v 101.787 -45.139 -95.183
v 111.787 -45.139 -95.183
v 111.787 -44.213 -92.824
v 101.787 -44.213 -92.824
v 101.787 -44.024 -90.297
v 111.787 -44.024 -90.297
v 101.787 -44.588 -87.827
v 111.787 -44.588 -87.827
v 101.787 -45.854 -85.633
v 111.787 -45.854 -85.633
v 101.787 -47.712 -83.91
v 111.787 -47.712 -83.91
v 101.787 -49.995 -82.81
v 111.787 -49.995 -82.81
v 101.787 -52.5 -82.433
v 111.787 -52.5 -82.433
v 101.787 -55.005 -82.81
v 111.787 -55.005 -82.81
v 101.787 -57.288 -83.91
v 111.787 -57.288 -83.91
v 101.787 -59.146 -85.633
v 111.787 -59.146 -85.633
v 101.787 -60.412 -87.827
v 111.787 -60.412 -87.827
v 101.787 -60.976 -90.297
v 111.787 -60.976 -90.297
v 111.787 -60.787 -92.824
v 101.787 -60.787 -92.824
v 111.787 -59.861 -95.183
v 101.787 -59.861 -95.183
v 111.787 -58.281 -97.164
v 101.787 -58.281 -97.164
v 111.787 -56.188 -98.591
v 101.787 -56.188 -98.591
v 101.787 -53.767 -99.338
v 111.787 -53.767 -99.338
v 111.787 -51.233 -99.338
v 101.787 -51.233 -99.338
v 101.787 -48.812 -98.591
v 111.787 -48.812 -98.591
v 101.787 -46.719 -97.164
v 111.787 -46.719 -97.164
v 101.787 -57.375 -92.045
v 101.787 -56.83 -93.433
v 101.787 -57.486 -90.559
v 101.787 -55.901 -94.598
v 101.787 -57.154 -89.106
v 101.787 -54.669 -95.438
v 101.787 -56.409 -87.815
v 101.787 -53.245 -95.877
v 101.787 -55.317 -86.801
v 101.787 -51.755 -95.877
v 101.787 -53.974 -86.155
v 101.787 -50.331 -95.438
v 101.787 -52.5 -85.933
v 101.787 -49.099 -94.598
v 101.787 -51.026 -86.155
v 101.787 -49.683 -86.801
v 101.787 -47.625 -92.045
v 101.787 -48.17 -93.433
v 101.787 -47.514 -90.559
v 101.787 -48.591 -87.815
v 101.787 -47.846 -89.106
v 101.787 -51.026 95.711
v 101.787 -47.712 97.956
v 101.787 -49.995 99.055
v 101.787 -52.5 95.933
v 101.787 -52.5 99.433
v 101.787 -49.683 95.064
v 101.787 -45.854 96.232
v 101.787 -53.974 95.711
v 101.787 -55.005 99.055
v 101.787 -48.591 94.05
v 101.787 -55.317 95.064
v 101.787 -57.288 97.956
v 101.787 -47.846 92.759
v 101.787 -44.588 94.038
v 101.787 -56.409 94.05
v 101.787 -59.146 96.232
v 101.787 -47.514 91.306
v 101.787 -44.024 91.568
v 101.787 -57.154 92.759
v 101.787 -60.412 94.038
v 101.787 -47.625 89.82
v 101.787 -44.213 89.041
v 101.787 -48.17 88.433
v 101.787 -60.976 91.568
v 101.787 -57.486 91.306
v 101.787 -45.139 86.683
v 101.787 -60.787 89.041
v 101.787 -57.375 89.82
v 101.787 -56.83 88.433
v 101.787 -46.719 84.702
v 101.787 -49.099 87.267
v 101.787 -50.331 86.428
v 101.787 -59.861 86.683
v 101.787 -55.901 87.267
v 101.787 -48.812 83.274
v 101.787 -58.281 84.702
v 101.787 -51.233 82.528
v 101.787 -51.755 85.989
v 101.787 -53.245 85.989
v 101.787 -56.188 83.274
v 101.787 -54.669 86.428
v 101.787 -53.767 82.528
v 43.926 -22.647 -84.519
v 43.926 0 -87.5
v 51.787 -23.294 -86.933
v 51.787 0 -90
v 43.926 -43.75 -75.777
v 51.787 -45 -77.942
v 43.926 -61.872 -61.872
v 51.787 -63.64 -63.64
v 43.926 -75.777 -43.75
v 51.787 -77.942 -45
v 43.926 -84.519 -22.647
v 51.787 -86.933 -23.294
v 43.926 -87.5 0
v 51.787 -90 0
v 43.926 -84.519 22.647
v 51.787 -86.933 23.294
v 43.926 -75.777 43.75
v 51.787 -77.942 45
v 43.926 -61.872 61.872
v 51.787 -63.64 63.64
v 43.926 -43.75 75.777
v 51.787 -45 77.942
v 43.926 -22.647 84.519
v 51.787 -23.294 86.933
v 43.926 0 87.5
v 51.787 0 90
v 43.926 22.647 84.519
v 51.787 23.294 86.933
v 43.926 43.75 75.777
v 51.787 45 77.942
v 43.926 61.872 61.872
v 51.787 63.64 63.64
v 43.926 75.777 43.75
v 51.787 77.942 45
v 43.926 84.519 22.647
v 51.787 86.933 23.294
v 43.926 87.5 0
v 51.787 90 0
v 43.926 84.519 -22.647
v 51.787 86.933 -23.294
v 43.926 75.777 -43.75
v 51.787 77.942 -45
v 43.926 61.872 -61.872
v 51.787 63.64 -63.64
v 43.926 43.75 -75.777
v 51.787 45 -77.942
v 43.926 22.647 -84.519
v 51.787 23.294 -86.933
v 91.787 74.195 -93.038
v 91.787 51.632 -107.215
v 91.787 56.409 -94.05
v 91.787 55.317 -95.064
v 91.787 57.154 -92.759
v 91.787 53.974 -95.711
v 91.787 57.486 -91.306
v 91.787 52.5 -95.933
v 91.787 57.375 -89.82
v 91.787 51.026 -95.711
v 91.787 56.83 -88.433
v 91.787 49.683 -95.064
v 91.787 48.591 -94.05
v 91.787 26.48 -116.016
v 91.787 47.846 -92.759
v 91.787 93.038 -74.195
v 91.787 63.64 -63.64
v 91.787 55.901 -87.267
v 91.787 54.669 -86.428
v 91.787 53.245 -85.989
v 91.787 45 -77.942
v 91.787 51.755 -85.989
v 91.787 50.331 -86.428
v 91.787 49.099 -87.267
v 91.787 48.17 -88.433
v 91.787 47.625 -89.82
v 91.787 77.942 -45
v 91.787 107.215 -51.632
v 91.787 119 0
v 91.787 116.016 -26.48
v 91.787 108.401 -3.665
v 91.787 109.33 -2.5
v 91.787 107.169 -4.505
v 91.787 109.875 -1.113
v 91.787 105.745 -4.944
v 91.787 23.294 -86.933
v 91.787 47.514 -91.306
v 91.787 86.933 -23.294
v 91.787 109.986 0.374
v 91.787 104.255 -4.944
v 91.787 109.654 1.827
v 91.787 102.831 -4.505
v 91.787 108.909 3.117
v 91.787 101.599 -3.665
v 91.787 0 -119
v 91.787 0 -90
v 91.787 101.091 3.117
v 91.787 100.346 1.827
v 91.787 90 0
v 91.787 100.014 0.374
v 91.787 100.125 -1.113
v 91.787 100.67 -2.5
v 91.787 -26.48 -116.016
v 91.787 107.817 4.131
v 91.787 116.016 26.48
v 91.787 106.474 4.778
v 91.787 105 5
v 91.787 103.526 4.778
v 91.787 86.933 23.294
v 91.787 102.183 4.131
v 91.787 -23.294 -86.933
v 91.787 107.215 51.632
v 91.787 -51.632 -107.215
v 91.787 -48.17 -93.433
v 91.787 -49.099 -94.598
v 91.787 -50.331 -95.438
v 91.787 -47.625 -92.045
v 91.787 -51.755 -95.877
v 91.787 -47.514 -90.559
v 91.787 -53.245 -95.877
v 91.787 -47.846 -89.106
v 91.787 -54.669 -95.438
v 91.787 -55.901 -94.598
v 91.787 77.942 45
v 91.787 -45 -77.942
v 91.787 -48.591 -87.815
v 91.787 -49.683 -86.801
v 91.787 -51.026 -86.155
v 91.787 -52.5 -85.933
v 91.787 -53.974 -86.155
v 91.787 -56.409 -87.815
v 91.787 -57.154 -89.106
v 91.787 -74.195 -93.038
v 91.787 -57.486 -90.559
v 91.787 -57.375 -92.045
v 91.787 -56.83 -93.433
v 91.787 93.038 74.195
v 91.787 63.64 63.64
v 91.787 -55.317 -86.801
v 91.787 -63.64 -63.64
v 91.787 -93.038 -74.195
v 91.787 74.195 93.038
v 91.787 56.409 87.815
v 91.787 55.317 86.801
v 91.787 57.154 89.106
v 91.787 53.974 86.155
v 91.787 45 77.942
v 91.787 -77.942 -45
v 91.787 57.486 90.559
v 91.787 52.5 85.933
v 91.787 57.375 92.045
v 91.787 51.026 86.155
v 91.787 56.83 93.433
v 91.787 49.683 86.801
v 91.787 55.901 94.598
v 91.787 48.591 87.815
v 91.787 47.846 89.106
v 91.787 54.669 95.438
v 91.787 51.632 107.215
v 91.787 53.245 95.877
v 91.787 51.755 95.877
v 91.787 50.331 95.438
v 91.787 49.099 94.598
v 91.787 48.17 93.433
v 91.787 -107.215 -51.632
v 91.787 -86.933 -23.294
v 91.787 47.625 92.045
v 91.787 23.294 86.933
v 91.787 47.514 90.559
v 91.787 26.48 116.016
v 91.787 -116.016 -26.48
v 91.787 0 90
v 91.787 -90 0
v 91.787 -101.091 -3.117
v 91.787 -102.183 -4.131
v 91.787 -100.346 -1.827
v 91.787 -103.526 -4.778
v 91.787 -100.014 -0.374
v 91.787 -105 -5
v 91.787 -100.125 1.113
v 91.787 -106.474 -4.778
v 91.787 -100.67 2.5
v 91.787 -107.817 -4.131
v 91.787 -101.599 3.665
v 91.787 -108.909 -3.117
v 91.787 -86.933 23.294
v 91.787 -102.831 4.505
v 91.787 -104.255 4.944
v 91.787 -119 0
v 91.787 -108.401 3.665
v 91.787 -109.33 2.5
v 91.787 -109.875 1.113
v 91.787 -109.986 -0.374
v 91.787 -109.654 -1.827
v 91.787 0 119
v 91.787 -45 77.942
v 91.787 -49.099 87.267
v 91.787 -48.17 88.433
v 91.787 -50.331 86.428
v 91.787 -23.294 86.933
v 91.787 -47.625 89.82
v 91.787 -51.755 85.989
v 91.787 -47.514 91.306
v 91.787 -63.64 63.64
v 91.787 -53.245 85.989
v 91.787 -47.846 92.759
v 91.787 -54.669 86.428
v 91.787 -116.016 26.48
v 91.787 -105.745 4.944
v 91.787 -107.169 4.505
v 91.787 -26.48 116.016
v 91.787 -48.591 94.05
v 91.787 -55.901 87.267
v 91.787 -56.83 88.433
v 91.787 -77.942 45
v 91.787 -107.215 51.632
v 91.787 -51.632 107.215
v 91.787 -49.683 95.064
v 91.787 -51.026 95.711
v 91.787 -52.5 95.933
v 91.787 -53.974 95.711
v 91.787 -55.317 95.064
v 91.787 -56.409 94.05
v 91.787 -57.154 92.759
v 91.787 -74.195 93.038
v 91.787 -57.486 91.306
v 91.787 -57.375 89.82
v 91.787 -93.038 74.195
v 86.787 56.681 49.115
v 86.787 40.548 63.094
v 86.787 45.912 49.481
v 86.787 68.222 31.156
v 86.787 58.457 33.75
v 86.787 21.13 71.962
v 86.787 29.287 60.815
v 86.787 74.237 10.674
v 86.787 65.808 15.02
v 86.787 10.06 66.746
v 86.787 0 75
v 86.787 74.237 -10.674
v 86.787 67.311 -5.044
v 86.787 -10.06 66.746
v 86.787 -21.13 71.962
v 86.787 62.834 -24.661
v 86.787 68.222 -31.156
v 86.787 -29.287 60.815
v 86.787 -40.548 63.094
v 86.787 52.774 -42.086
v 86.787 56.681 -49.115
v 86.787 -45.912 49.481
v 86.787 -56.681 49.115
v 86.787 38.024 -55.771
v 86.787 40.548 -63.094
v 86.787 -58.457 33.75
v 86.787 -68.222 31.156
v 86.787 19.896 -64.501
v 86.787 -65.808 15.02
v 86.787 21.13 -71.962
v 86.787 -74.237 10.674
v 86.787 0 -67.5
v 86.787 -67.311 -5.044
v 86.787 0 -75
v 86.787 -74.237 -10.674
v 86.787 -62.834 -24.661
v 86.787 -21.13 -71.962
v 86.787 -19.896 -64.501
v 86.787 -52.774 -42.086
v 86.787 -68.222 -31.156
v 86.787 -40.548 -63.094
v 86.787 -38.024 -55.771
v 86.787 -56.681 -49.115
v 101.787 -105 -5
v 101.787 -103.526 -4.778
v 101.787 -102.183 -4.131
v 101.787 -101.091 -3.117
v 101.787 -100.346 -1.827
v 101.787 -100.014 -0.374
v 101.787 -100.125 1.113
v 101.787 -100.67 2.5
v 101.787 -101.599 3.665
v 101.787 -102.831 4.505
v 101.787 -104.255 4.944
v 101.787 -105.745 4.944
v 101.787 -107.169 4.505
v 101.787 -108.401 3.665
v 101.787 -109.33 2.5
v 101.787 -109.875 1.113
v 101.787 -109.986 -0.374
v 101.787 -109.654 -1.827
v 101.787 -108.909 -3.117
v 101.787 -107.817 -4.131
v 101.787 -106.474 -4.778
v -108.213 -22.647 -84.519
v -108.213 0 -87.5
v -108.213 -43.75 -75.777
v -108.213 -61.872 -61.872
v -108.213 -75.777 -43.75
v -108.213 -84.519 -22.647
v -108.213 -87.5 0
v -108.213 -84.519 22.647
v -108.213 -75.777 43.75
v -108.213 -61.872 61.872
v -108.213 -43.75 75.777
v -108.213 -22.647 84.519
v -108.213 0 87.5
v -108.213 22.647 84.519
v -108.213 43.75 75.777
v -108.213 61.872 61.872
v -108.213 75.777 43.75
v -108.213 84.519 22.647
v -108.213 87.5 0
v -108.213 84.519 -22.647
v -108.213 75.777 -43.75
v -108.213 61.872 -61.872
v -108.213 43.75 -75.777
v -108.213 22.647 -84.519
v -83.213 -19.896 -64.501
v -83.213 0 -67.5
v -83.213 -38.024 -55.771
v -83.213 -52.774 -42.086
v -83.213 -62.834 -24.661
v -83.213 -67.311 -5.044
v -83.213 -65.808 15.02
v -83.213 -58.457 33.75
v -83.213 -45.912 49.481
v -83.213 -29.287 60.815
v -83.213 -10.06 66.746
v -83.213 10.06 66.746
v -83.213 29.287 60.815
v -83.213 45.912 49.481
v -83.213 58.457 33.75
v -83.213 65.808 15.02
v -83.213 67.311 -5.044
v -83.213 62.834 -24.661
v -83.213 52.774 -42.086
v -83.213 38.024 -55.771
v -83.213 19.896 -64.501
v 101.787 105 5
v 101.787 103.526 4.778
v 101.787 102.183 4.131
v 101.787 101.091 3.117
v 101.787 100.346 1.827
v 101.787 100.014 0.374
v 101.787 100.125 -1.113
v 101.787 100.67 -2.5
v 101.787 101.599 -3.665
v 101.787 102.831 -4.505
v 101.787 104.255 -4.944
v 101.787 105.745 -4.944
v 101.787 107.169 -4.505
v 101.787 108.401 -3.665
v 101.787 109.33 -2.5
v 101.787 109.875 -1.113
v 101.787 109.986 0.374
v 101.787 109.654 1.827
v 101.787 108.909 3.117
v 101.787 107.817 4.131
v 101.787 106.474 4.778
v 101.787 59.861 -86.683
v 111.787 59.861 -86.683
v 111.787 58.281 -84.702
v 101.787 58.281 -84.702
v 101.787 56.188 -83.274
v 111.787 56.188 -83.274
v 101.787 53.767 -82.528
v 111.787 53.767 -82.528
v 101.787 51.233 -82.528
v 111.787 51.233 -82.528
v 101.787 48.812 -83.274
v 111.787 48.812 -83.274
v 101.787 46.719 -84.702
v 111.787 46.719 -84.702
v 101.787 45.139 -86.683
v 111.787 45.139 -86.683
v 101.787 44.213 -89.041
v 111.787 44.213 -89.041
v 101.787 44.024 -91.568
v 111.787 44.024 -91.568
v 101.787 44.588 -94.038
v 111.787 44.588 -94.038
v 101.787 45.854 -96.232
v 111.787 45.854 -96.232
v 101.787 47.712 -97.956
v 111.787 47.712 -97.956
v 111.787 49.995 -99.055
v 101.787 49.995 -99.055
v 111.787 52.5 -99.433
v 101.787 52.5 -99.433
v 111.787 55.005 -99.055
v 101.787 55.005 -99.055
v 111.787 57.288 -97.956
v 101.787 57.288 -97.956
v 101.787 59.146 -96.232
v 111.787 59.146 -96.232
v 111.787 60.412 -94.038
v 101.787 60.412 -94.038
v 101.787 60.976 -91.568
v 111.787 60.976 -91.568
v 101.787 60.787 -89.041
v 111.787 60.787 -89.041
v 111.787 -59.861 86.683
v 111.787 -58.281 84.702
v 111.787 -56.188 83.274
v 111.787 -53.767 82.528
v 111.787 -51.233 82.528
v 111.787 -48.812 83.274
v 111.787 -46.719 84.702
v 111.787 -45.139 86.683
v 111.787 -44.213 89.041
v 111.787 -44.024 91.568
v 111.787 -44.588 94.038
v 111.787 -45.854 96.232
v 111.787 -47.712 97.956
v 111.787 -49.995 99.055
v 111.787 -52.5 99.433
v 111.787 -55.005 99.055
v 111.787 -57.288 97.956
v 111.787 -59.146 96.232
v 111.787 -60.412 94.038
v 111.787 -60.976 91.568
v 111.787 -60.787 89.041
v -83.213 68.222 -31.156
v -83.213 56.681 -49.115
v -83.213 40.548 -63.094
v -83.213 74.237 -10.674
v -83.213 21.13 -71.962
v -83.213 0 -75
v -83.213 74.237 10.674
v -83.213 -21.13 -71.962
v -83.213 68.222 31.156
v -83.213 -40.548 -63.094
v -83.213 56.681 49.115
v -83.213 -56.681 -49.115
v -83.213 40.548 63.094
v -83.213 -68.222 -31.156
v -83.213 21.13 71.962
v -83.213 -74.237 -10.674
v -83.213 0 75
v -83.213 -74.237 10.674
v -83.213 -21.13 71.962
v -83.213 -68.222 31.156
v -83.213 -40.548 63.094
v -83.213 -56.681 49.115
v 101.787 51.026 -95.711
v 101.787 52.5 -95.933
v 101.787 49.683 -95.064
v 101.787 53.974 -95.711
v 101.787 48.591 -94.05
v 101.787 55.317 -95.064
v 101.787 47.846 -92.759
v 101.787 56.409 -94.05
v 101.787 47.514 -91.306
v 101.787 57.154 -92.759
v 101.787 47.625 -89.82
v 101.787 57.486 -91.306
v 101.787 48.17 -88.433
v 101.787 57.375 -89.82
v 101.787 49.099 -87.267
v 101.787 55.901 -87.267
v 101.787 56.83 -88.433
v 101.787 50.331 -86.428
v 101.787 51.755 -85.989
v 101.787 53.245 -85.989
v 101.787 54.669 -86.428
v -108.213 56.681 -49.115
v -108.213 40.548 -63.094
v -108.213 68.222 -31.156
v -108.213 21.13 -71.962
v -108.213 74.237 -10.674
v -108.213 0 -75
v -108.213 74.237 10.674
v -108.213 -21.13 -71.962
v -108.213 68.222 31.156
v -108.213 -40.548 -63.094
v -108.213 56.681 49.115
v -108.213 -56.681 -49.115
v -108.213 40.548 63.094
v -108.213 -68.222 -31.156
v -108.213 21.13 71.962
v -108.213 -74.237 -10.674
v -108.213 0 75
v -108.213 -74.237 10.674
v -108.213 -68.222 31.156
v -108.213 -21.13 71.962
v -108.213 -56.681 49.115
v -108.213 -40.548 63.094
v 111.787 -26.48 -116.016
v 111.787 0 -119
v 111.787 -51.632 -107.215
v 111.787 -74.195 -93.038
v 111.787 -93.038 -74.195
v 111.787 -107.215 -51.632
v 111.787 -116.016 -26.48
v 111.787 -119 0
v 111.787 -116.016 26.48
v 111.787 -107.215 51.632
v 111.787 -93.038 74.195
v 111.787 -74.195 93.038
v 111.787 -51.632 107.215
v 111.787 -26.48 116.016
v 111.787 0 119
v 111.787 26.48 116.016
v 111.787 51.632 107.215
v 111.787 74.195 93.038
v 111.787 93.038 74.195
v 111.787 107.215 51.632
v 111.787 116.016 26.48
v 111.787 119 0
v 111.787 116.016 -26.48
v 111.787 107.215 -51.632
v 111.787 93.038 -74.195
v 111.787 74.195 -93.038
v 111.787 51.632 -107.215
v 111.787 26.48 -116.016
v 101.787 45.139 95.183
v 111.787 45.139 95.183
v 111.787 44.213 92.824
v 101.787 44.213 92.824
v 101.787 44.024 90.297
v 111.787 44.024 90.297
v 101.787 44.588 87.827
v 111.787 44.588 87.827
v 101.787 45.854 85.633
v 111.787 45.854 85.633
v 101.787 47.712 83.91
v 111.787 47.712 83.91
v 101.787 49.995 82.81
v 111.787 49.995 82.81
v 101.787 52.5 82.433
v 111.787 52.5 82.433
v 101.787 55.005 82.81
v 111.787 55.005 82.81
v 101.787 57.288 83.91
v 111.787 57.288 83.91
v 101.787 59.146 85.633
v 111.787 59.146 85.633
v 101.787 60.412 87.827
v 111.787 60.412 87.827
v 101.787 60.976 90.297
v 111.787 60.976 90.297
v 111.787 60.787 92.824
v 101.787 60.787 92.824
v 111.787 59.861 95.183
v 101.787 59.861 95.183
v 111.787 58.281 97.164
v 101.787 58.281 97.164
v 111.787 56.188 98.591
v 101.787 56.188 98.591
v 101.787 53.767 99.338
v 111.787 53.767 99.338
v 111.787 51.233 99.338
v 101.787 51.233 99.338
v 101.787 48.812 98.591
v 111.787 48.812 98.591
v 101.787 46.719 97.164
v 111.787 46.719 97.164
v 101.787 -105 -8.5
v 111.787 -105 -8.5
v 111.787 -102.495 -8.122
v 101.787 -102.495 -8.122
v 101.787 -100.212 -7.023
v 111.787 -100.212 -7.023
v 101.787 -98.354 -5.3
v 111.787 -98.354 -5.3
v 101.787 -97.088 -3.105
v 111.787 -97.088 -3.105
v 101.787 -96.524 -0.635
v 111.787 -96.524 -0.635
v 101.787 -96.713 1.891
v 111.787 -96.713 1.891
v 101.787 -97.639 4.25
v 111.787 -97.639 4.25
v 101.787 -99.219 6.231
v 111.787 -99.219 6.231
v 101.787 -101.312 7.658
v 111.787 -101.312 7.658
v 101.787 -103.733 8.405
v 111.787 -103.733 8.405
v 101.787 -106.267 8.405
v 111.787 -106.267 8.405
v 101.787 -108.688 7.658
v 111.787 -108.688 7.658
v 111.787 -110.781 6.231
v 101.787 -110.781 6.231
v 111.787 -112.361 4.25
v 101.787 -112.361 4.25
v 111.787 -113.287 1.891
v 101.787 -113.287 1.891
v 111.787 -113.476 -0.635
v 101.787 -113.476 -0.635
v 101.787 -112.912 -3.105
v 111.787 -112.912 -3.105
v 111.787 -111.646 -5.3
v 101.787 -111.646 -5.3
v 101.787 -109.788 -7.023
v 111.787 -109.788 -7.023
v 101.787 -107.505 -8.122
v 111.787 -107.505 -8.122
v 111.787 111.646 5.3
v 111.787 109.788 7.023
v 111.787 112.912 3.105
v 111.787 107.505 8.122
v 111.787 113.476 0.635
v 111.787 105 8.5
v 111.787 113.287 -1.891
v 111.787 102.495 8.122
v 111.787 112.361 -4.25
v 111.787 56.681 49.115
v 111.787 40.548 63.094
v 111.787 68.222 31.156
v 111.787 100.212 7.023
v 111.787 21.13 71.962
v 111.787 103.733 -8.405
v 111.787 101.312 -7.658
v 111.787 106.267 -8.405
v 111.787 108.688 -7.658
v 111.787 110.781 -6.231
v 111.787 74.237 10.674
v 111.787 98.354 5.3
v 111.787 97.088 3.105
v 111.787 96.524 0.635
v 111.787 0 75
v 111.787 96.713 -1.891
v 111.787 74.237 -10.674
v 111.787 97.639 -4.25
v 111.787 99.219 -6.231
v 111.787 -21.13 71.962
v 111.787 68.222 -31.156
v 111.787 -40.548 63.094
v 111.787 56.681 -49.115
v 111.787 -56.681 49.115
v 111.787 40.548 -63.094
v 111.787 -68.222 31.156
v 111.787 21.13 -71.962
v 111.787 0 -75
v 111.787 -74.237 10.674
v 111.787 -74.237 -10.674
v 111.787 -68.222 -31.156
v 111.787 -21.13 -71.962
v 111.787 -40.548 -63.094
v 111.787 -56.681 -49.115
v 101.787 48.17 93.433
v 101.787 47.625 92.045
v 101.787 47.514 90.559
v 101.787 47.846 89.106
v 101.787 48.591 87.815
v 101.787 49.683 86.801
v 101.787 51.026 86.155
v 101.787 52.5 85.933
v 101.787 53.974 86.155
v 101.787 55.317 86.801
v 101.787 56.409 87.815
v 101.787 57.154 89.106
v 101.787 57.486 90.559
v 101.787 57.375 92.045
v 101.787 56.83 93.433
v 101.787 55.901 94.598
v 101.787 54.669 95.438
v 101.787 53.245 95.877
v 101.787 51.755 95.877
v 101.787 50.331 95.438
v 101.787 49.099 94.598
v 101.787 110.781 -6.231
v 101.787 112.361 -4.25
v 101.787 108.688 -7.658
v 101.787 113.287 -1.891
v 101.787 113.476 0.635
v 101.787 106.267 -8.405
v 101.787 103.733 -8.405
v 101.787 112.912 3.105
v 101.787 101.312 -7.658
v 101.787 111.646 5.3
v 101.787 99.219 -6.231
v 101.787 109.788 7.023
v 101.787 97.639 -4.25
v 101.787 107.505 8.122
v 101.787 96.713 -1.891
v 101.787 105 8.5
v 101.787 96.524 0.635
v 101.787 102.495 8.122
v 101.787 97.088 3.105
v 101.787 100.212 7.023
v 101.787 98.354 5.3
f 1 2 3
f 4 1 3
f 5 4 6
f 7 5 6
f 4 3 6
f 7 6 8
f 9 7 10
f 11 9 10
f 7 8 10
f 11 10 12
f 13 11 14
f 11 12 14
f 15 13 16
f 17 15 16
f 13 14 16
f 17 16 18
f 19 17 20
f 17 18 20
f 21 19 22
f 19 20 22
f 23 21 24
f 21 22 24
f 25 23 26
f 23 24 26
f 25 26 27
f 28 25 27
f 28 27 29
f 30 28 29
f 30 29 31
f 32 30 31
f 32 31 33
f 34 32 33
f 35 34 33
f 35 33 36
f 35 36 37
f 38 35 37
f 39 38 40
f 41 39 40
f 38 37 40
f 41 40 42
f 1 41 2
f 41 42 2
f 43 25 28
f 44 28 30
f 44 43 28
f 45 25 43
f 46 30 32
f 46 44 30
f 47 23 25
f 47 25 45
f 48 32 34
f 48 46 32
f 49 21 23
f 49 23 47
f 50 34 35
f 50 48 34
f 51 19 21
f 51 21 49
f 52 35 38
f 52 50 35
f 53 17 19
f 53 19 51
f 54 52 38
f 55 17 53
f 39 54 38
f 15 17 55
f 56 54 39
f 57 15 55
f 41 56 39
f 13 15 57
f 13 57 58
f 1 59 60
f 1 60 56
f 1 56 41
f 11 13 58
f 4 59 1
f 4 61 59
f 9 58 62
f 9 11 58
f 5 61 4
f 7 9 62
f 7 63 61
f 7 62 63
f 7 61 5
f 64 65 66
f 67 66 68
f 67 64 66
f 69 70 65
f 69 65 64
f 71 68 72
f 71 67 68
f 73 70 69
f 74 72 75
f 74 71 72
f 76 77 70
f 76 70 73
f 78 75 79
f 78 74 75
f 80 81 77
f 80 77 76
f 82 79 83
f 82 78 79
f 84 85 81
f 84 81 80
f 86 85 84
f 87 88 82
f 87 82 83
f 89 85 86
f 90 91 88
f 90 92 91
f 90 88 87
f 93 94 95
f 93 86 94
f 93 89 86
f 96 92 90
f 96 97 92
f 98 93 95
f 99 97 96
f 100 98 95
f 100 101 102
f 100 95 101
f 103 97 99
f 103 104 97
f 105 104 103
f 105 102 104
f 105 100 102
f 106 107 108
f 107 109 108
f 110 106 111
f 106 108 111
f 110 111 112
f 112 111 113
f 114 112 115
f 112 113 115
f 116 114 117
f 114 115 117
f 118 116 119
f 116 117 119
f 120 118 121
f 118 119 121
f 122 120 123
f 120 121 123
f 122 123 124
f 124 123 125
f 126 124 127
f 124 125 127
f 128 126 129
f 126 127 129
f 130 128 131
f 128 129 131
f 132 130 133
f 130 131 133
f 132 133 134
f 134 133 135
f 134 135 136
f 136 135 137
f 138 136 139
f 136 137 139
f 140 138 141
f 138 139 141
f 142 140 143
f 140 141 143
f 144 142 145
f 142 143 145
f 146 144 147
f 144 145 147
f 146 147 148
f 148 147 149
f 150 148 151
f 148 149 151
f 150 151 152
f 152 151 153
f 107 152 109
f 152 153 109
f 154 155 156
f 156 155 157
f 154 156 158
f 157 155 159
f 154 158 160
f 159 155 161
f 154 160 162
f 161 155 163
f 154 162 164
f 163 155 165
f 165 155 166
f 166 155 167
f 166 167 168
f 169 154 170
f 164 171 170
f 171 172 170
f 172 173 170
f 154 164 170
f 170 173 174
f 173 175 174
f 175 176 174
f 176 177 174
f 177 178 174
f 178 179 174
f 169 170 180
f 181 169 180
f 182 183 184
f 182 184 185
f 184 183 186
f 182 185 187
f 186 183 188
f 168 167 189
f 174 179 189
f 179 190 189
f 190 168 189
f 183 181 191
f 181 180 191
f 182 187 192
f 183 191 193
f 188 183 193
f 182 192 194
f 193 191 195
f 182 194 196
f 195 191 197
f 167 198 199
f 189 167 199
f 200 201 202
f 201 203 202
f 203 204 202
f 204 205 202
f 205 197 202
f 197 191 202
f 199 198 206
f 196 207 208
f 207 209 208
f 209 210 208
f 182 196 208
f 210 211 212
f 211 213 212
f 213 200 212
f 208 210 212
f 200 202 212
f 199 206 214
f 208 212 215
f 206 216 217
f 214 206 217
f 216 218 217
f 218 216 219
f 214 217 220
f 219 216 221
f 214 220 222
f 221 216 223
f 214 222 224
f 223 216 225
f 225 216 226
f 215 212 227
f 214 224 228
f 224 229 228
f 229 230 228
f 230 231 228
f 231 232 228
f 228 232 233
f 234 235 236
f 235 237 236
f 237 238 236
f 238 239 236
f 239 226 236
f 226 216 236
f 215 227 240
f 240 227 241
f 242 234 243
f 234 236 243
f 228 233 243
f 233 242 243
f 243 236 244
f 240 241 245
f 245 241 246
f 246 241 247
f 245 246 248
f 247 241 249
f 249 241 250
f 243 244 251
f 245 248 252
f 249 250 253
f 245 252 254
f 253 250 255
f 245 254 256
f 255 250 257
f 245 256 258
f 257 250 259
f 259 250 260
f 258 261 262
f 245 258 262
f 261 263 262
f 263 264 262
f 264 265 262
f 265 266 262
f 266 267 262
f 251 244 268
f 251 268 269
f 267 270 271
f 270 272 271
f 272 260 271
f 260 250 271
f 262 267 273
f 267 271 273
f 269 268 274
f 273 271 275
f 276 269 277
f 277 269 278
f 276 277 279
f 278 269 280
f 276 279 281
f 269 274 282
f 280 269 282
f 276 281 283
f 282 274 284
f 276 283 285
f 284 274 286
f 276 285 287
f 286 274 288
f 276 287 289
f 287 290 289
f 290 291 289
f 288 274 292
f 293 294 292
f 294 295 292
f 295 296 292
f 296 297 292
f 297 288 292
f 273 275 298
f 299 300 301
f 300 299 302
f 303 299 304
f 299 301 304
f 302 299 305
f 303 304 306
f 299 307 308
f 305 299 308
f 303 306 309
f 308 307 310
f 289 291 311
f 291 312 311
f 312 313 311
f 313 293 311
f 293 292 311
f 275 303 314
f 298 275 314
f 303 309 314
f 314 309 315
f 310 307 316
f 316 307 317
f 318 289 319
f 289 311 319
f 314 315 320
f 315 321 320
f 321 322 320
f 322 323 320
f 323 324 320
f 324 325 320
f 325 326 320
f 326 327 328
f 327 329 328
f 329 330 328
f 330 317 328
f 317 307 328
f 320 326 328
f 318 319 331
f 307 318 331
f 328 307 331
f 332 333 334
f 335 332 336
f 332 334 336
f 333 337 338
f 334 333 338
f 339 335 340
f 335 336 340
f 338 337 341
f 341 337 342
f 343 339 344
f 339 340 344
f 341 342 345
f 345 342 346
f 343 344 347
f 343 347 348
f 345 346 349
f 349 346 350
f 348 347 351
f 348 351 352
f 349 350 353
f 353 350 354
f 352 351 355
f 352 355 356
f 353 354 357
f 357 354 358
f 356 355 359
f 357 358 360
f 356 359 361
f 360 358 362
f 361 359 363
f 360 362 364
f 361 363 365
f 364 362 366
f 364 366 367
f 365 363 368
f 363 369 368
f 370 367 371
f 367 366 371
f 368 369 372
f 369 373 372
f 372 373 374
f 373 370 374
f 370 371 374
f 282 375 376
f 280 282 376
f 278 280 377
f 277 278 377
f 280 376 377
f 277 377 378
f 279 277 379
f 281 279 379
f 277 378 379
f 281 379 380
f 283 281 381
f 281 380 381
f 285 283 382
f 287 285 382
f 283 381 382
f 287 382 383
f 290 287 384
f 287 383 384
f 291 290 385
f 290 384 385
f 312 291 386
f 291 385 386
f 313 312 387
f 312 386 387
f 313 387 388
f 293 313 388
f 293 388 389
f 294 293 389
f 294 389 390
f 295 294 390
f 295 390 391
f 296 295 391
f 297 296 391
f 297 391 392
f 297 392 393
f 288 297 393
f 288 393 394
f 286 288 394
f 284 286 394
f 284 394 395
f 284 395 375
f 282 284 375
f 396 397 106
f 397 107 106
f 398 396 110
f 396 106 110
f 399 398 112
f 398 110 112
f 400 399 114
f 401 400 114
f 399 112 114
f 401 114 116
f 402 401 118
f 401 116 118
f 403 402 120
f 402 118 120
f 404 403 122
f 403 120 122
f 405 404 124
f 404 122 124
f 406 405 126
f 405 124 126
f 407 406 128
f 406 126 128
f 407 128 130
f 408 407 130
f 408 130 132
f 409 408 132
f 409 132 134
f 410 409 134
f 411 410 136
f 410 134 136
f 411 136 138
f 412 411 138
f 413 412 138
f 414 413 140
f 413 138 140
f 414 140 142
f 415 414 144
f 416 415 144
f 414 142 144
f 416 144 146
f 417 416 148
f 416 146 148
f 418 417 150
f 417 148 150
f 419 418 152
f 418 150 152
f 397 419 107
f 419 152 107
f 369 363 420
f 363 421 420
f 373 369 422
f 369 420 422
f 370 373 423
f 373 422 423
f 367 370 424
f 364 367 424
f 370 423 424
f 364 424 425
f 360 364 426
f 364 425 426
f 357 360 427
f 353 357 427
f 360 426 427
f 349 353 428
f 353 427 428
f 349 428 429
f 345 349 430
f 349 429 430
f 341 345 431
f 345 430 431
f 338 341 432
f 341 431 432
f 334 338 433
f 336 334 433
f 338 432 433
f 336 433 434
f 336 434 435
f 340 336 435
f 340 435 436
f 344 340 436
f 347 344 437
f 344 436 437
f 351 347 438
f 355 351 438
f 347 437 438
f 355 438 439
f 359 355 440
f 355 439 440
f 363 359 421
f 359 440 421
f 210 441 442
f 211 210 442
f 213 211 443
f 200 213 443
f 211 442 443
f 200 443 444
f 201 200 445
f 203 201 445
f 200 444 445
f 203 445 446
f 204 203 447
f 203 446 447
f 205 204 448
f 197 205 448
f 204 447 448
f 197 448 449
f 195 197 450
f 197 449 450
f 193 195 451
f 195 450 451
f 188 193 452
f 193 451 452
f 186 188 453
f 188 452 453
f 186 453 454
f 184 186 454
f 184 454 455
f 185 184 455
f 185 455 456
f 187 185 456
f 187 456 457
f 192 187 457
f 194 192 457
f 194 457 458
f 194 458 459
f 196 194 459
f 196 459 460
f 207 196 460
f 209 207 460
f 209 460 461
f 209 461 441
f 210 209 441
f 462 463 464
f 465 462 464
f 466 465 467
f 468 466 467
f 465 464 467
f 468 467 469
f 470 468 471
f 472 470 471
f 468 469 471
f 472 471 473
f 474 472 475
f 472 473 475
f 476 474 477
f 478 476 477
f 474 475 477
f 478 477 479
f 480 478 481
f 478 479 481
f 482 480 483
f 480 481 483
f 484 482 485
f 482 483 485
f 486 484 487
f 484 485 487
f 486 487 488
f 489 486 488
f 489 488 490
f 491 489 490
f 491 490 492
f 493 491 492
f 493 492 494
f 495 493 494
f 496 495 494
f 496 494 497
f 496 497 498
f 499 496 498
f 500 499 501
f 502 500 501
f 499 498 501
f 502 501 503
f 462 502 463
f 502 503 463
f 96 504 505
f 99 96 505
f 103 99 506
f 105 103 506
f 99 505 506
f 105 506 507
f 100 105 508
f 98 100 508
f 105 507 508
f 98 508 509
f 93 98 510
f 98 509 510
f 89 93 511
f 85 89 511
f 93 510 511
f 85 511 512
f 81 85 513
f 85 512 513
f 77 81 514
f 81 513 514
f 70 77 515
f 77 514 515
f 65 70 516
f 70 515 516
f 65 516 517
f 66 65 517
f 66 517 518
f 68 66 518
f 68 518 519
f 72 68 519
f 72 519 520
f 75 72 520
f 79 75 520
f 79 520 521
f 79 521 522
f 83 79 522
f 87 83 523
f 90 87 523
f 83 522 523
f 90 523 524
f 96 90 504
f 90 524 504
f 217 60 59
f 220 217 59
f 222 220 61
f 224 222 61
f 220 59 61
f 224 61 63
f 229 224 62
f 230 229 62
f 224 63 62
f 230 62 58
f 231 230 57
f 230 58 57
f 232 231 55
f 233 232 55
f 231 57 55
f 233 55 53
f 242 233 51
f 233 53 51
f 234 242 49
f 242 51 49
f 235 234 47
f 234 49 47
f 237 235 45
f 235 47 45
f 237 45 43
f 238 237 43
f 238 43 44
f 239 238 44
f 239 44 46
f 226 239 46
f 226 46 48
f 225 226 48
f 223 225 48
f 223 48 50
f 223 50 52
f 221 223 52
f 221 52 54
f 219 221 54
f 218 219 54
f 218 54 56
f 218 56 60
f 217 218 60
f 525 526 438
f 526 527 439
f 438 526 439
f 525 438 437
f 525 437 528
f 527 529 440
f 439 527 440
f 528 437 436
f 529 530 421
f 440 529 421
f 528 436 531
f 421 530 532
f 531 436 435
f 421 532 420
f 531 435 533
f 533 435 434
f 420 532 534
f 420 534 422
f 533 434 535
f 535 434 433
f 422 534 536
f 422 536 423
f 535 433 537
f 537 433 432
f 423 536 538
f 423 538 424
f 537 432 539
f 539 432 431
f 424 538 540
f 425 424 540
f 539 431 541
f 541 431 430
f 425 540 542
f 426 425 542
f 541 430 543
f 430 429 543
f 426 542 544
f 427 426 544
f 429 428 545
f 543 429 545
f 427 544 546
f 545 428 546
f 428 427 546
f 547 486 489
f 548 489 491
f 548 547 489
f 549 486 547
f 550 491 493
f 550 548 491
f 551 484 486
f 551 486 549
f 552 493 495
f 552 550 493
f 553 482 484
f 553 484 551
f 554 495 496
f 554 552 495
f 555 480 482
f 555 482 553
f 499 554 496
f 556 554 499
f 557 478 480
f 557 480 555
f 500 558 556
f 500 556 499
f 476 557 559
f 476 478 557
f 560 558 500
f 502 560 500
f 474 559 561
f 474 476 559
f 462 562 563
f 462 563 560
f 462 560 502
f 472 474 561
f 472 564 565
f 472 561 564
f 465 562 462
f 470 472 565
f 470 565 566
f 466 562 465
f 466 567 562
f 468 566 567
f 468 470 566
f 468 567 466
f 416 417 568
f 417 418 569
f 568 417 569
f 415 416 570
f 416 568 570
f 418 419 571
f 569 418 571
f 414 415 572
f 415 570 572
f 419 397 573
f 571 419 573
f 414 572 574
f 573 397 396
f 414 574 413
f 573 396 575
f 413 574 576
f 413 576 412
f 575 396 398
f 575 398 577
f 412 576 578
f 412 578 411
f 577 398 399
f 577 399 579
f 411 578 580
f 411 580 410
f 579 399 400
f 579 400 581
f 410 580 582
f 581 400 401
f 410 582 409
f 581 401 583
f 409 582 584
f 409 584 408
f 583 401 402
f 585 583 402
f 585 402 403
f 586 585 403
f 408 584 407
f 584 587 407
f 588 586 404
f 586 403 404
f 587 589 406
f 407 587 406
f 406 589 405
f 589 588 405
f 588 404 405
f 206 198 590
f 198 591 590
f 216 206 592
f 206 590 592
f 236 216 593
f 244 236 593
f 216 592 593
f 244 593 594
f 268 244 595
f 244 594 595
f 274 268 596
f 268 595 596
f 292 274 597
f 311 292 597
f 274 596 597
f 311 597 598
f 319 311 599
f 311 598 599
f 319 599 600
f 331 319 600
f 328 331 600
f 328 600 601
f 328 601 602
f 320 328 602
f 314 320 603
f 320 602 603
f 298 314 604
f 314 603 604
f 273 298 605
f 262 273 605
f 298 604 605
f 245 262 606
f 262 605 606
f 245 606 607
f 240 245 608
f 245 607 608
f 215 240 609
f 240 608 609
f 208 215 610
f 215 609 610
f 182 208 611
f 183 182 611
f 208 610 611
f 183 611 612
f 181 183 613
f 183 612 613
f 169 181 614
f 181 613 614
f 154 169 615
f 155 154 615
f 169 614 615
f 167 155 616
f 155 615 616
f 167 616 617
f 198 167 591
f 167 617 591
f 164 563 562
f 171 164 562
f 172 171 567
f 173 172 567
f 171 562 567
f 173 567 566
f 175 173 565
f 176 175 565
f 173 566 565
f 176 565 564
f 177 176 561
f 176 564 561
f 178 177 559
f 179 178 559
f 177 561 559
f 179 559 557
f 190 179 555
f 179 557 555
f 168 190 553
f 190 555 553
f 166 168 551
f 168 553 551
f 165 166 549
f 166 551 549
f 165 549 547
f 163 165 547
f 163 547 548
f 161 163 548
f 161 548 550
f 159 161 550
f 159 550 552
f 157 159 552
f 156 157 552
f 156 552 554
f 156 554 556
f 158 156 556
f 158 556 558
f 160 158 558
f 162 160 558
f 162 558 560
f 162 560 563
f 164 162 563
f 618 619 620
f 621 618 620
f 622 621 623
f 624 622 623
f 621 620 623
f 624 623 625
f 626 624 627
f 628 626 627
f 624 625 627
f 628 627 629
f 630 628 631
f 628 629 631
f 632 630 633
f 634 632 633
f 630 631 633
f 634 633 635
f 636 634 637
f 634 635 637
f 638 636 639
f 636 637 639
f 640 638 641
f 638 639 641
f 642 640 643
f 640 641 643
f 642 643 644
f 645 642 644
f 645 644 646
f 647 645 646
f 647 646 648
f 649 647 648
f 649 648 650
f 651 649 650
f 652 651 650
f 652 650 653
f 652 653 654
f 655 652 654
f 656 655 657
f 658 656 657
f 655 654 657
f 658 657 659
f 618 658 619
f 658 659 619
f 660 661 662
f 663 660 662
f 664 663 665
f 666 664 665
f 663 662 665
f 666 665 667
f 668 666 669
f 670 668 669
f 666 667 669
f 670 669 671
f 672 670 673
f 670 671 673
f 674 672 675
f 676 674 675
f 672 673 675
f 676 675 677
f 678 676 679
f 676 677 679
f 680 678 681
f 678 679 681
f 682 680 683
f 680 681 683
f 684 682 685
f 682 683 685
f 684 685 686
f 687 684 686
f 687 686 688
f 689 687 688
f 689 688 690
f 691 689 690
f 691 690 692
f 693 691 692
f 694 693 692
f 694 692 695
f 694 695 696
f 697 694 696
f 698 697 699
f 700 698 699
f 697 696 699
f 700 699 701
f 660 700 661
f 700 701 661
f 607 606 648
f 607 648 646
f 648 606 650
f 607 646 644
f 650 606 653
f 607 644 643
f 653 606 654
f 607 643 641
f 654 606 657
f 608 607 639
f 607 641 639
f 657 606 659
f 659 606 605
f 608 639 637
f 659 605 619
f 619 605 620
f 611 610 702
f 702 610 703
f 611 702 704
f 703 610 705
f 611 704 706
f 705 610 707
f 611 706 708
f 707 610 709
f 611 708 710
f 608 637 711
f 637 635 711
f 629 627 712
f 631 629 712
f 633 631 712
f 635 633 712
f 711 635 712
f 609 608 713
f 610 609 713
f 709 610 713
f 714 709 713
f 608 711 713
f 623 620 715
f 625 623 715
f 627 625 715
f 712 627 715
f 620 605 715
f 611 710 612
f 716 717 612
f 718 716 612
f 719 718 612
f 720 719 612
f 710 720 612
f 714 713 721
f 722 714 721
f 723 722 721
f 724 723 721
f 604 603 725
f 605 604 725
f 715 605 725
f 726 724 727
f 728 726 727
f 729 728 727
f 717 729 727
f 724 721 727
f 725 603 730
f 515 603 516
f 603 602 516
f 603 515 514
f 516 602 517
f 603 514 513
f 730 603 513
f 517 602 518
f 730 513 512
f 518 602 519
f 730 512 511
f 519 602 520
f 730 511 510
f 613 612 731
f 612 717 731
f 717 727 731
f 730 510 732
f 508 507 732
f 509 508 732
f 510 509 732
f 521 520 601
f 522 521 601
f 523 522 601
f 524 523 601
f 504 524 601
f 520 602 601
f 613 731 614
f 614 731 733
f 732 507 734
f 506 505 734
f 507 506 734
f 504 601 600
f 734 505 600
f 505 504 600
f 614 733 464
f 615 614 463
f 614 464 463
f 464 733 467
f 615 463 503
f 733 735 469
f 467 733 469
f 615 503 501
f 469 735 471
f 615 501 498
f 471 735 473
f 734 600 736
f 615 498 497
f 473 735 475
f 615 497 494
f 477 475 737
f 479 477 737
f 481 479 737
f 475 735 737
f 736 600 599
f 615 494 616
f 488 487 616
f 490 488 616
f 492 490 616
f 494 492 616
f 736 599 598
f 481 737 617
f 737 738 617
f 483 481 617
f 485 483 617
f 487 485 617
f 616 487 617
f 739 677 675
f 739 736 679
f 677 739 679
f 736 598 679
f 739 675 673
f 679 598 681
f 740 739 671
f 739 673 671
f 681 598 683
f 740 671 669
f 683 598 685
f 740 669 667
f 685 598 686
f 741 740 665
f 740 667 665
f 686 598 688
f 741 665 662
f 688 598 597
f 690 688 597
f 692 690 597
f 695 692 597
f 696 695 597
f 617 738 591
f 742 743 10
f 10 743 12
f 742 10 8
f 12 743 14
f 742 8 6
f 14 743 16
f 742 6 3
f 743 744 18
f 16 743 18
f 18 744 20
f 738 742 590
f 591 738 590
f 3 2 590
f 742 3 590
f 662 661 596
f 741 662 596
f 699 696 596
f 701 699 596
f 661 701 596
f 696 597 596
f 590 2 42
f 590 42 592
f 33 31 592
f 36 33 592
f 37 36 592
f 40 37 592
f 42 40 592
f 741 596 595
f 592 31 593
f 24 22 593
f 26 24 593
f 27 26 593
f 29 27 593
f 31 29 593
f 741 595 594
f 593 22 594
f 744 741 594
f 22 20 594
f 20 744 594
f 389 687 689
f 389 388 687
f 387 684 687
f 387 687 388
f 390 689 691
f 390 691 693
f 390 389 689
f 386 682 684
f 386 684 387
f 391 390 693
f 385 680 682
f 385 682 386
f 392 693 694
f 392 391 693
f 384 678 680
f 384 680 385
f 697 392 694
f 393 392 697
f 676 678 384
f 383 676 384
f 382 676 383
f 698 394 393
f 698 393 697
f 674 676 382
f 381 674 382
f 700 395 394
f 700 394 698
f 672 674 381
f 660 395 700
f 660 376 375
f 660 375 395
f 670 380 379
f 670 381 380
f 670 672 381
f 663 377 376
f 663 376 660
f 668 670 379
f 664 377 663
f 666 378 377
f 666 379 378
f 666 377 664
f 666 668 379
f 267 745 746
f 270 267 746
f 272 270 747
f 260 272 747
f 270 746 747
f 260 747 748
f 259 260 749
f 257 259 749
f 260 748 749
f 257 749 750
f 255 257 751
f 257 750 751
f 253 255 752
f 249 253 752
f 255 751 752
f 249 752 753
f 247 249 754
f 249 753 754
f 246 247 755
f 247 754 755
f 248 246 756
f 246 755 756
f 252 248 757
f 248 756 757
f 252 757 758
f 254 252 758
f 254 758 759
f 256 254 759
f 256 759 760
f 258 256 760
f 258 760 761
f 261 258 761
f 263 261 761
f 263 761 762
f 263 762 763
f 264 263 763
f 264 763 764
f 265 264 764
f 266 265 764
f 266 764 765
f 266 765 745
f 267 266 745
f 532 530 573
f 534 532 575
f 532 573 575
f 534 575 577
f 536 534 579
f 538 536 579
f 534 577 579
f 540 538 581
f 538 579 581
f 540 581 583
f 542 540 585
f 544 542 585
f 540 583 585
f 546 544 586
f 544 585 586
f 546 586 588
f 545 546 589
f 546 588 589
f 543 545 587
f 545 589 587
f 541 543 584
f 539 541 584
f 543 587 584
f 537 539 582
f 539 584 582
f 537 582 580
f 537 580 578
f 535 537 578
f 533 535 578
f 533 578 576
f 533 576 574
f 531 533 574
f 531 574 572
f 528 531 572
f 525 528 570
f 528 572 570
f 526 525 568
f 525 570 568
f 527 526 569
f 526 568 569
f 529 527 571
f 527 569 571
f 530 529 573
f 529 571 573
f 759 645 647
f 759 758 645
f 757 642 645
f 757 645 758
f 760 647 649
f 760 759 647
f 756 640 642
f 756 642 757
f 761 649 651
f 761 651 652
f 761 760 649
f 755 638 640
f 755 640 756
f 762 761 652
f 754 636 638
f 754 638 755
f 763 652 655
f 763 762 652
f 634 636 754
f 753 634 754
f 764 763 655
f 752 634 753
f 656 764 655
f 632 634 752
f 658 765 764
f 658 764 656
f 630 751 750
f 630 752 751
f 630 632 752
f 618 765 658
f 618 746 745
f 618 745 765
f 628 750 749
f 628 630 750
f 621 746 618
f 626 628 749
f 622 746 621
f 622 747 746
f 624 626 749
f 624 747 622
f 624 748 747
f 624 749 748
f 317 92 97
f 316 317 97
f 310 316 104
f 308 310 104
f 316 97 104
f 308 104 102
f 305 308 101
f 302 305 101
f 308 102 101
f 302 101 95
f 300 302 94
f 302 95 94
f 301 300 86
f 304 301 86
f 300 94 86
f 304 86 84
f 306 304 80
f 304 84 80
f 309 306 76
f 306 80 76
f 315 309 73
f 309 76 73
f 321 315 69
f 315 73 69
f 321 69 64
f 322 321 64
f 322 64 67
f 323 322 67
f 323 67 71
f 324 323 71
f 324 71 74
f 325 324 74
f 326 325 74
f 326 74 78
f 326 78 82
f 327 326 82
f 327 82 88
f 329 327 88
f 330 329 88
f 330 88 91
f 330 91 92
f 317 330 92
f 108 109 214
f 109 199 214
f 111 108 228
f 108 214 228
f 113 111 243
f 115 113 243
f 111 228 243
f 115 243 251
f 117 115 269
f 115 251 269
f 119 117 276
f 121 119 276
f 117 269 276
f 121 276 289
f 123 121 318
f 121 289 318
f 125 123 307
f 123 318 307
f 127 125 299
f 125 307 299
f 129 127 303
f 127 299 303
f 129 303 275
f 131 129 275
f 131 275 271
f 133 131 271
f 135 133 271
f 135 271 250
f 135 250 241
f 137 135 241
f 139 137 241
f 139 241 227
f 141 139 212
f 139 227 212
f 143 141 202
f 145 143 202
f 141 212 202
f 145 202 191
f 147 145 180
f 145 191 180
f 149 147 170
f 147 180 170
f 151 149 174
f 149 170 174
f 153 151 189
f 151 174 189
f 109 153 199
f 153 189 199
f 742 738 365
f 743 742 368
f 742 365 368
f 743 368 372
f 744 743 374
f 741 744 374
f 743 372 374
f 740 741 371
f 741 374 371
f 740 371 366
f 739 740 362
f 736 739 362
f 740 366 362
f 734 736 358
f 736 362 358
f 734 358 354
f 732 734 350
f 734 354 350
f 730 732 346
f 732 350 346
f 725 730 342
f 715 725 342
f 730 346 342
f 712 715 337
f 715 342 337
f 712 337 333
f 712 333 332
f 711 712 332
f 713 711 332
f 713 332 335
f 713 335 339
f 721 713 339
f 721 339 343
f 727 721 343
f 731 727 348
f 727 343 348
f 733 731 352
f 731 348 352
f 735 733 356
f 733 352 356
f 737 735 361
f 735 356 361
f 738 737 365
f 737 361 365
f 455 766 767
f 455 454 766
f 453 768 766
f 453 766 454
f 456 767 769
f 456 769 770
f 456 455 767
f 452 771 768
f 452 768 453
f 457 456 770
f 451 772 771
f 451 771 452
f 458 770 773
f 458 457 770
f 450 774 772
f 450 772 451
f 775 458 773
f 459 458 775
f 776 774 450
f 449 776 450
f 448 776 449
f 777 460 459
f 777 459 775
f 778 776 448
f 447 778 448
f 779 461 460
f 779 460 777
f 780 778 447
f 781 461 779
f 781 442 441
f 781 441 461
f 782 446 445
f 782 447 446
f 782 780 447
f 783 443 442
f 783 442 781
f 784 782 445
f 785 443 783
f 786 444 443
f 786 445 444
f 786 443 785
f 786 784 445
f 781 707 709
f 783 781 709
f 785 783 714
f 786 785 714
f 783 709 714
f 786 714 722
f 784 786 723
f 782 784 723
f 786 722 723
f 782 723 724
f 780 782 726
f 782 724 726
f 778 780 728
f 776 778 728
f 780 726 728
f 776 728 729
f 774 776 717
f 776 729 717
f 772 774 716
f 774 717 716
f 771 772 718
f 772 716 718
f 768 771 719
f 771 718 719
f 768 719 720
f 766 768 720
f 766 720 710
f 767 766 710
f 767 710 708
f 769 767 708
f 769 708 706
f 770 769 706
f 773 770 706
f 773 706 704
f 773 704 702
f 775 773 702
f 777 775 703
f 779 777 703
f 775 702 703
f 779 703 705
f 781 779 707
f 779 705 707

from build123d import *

# Parameters (mm, degrees)
SCHIZZO12_R                 = 5
TAGLIO_ESTRUSIONE1_DEPTH    = 20
SCHIZZO13_R                 = 8.5
TAGLIO_ESTRUSIONE2_DEPTH    = 10
RIPETIZIONECIRCOLARE1_COUNT = 6


with BuildPart() as part:
    # Schizzo1 → Rivoluzione1 (revolve)
    with BuildSketch(Plane.XY, mode=Mode.PRIVATE) as rivoluzione1_sk:
        Polygon((-83.213348426, 75), (-108.213348426, 75), (-108.213348426, 87.5), (43.926418272, 87.5), (51.786651574, 90), (91.786651574, 90), (91.786651574, 119), (111.786651574, 119), (111.786651574, 75), (86.786651574, 75), (86.786651574, 67.5), (-83.213348426, 67.5), align=None)
    revolve(rivoluzione1_sk.sketch.rotate(Axis((0, 0, 0), (-1, 0, 0)), 90), axis=Axis((0, 0, 0), (-1, 0, 0)))

    # Schizzo12 → Taglio-Estrusione1 (cut)
    with BuildSketch(Plane(origin=(111.786651574, 0, 0), x_dir=(0, 0, -1), z_dir=(1, 0, 0))):
        with Locations((0, -105)):
            Circle(SCHIZZO12_R)
    taglio_estrusione1 = extrude(amount=-TAGLIO_ESTRUSIONE1_DEPTH, mode=Mode.SUBTRACT)

    # Schizzo13 → Taglio-Estrusione2 (cut)
    with BuildSketch(Plane(origin=(111.786651574, 0, 0), x_dir=(0, 0, -1), z_dir=(1, 0, 0))):
        with Locations((0, -105)):
            Circle(SCHIZZO13_R)
    taglio_estrusione2 = extrude(amount=-TAGLIO_ESTRUSIONE2_DEPTH, mode=Mode.SUBTRACT)

    # RipetizioneCircolare1: Taglio-Estrusione1, Taglio-Estrusione2 ×6 about axis
    ripetizionecircolare1_axis = Axis((0, 0, 0), (1, 0, 0))
    add([taglio_estrusione1.rotate(ripetizionecircolare1_axis, i * 360 / RIPETIZIONECIRCOLARE1_COUNT) for i in range(1, RIPETIZIONECIRCOLARE1_COUNT)], mode=Mode.SUBTRACT)
    add([taglio_estrusione2.rotate(ripetizionecircolare1_axis, i * 360 / RIPETIZIONECIRCOLARE1_COUNT) for i in range(1, RIPETIZIONECIRCOLARE1_COUNT)], mode=Mode.SUBTRACT)


solid = part.part
